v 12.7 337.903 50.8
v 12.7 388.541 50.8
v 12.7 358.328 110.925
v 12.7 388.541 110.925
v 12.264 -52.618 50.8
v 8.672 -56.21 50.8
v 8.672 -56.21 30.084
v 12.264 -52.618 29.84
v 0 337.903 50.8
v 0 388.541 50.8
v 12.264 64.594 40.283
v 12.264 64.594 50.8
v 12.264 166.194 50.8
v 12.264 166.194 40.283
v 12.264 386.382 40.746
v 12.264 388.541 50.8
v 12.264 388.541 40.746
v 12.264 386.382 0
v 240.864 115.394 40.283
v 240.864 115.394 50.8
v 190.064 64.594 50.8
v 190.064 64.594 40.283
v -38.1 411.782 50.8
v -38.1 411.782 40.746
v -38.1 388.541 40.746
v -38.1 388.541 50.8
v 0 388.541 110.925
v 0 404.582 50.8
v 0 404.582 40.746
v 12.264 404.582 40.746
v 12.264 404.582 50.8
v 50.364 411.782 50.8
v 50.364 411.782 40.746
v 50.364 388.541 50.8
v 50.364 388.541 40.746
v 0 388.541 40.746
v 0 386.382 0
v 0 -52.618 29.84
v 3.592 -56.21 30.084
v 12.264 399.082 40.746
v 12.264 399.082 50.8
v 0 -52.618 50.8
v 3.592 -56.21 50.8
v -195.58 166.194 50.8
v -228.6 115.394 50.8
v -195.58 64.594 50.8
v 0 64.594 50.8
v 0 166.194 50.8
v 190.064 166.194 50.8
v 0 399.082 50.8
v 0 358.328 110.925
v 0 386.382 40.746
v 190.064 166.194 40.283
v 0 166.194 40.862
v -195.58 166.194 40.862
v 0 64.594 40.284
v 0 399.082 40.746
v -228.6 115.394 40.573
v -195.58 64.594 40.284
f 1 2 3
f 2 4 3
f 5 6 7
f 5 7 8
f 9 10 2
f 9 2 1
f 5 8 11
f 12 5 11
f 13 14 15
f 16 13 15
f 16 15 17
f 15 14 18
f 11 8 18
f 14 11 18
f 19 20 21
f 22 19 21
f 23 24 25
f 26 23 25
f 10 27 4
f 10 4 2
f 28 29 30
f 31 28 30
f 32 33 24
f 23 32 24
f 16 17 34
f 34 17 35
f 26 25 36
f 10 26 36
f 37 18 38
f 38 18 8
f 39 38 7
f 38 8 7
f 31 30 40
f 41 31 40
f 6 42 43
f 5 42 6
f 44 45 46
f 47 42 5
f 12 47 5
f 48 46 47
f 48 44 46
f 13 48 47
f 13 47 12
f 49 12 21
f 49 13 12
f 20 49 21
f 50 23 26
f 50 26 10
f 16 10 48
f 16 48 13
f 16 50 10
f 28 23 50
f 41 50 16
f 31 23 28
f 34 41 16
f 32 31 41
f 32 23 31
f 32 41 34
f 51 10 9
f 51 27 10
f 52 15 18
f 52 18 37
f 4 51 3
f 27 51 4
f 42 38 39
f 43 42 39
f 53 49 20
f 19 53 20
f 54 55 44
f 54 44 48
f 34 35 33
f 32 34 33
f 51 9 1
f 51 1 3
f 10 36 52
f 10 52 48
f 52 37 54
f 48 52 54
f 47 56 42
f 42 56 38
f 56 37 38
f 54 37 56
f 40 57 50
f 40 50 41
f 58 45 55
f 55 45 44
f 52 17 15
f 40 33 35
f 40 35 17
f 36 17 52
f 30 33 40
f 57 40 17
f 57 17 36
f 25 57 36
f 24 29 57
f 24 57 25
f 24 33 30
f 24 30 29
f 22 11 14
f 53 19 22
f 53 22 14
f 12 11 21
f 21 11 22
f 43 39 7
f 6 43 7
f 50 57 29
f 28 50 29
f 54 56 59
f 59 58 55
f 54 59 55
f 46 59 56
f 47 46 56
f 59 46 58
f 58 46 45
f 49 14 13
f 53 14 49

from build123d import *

# Parameters (mm, degrees)
F0_W      = 12.2642048969
F0_H      = 10.5410516262
F0_H_2    = 222.347571218
F0_H_3    = 101.6
F0_W_2    = 228.6
F1_DEPTH  = 50.8
F2_W      = 101.6
F2_H      = 40.2828603983
F3_DEPTH  = 228.6
F5_DEPTH  = 228.6
F7_DEPTH  = 25.4
F8_W      = 88.4642048969
F8_H      = 40.7456643879
F9_DEPTH  = 25.4
F11_DEPTH = 12.7
F13_DEPTH = 25.4
F15_DEPTH = 25.4
F17_DEPTH = 25.4


with BuildPart() as f1:
    # F0 (on Top) → F1 (new body)
    with BuildSketch(Plane.XY):
        Polygon((0, 399.0824818611), (0, 404.5822042346), (12.2642048969, 404.5822042346), (12.2642048969, 403.4197628498), (12.2642048969, 399.0824818611), (12.2642048969, 388.5414302349), (37.6642048969, 388.5414302349), (50.3642048969, 388.5414302349), (50.3642048969, 399.0824818611), (50.3642048969, 411.7824818611), (-38.1, 411.7824818611), (-38.1, 399.0824818611), (-38.1, 388.5414302349), (-25.4, 388.5414302349), (0, 388.5414302349), align=None)
        with Locations((6.1321024484, 393.811956048)):
            Rectangle(F0_W, F0_H)
        with Locations((6.1321024484, 277.3676446259)):
            Rectangle(F0_W, F0_H_2)
        with Locations((6.1321024484, 115.3938590169)):
            Rectangle(F0_W, F0_H_3)
        with Locations((-114.3, 115.3938590169)):
            Rectangle(F0_W_2, F0_H_3)
        Polygon((12.2642048969, 64.5938590169), (0, 64.5938590169), (0, -52.6177957654), (3.5921024484, -56.2098982138), (8.6721024484, -56.2098982138), (12.2642048969, -52.6177957654), align=None)
        with Locations((126.5642048969, 115.3938590169)):
            Rectangle(F0_W_2, F0_H_3)
    extrude(amount=F1_DEPTH)

    # F2 (on face) → F3 (cut)
    with BuildSketch(Plane.YZ.offset(240.8642048969)):
        with Locations((115.3938590169, 20.1414301991)):
            Rectangle(F2_W, F2_H)
    extrude(amount=-F3_DEPTH, mode=Mode.SUBTRACT)

    # F4 (on face) → F5 (cut)
    with BuildSketch(Plane(origin=(-228.6, 0, 0), x_dir=(0, -1, 0), z_dir=(-1, 0, 0))):
        Polygon((-64.5938590169, 40.2844), (-166.1938590169, 40.8619193254), (-166.1938590169, 40.2844), align=None)
        Polygon((-166.1938590169, 40.2844), (-166.1938590169, 40.8619193254), (-166.4173752069, 40.8631898463), (-166.1938590169, 0), (-64.5938590169, 0), (-64.5938590169, 40.2844), align=None)
    extrude(amount=-F5_DEPTH, mode=Mode.SUBTRACT)

    # F6 (on face) → F7 (cut)
    with BuildSketch(Plane.YZ):
        Polygon((404.5822042346, 0), (865.3968534112, 33.1447981298), (56.4681179821, 0), align=None)
    extrude(amount=-F7_DEPTH, mode=Mode.SUBTRACT)

    # F8 (on face) → F9 (cut)
    with BuildSketch(Plane(origin=(0, 411.7824818611, 0), x_dir=(-1, 0, 0), z_dir=(0, 1, 0))):
        with Locations((-6.1321024484, 20.372832194)):
            Rectangle(F8_W, F8_H)
    extrude(amount=-F9_DEPTH, mode=Mode.SUBTRACT)

    # F12 (on face) → F13 (cut)
    with BuildSketch(Plane.YZ.offset(12.2642048969)):
        Polygon((386.3824818611, 0), (-56.5404929221, 30.106337741), (-56.5404929221, 0), align=None)
    extrude(amount=-F13_DEPTH, mode=Mode.SUBTRACT)

    # F14 (on face) → F15 (cut)
    with BuildSketch(Plane.XY.offset(50.8)):
        Polygon((-195.58, 64.5938590169), (-228.6, 115.3938590169), (-228.6, 64.5938590169), align=None)
        Polygon((-228.6, 115.3938590169), (-195.58, 166.1938590169), (-228.6, 166.1938590169), align=None)
    extrude(amount=-F15_DEPTH, mode=Mode.SUBTRACT)

    # F16 (on face) → F17 (cut)
    with BuildSketch(Plane.XY.offset(50.8)):
        Polygon((240.8642048969, 166.1938590169), (190.0642048969, 166.1938590169), (240.8642048969, 115.3938590169), align=None)
        Polygon((240.8642048969, 64.5938590169), (240.8642048969, 115.3938590169), (190.0642048969, 64.5938590169), align=None)
    extrude(amount=-F17_DEPTH, mode=Mode.SUBTRACT)


with BuildPart() as f11:
    # F10 (on face) → F11 (new body)
    with BuildSketch(Plane(origin=(0, 0, 0), x_dir=(0, -1, 0), z_dir=(-1, 0, 0))):
        Polygon((-388.5414302349, 50.8), (-337.903380394, 50.8), (-358.3284356136, 110.9254282253), (-388.5414302349, 110.9254282253), (-388.5414302349, 72.186909616), align=None)
    extrude(amount=-F11_DEPTH)


solid = Compound([f1.part, f11.part])
